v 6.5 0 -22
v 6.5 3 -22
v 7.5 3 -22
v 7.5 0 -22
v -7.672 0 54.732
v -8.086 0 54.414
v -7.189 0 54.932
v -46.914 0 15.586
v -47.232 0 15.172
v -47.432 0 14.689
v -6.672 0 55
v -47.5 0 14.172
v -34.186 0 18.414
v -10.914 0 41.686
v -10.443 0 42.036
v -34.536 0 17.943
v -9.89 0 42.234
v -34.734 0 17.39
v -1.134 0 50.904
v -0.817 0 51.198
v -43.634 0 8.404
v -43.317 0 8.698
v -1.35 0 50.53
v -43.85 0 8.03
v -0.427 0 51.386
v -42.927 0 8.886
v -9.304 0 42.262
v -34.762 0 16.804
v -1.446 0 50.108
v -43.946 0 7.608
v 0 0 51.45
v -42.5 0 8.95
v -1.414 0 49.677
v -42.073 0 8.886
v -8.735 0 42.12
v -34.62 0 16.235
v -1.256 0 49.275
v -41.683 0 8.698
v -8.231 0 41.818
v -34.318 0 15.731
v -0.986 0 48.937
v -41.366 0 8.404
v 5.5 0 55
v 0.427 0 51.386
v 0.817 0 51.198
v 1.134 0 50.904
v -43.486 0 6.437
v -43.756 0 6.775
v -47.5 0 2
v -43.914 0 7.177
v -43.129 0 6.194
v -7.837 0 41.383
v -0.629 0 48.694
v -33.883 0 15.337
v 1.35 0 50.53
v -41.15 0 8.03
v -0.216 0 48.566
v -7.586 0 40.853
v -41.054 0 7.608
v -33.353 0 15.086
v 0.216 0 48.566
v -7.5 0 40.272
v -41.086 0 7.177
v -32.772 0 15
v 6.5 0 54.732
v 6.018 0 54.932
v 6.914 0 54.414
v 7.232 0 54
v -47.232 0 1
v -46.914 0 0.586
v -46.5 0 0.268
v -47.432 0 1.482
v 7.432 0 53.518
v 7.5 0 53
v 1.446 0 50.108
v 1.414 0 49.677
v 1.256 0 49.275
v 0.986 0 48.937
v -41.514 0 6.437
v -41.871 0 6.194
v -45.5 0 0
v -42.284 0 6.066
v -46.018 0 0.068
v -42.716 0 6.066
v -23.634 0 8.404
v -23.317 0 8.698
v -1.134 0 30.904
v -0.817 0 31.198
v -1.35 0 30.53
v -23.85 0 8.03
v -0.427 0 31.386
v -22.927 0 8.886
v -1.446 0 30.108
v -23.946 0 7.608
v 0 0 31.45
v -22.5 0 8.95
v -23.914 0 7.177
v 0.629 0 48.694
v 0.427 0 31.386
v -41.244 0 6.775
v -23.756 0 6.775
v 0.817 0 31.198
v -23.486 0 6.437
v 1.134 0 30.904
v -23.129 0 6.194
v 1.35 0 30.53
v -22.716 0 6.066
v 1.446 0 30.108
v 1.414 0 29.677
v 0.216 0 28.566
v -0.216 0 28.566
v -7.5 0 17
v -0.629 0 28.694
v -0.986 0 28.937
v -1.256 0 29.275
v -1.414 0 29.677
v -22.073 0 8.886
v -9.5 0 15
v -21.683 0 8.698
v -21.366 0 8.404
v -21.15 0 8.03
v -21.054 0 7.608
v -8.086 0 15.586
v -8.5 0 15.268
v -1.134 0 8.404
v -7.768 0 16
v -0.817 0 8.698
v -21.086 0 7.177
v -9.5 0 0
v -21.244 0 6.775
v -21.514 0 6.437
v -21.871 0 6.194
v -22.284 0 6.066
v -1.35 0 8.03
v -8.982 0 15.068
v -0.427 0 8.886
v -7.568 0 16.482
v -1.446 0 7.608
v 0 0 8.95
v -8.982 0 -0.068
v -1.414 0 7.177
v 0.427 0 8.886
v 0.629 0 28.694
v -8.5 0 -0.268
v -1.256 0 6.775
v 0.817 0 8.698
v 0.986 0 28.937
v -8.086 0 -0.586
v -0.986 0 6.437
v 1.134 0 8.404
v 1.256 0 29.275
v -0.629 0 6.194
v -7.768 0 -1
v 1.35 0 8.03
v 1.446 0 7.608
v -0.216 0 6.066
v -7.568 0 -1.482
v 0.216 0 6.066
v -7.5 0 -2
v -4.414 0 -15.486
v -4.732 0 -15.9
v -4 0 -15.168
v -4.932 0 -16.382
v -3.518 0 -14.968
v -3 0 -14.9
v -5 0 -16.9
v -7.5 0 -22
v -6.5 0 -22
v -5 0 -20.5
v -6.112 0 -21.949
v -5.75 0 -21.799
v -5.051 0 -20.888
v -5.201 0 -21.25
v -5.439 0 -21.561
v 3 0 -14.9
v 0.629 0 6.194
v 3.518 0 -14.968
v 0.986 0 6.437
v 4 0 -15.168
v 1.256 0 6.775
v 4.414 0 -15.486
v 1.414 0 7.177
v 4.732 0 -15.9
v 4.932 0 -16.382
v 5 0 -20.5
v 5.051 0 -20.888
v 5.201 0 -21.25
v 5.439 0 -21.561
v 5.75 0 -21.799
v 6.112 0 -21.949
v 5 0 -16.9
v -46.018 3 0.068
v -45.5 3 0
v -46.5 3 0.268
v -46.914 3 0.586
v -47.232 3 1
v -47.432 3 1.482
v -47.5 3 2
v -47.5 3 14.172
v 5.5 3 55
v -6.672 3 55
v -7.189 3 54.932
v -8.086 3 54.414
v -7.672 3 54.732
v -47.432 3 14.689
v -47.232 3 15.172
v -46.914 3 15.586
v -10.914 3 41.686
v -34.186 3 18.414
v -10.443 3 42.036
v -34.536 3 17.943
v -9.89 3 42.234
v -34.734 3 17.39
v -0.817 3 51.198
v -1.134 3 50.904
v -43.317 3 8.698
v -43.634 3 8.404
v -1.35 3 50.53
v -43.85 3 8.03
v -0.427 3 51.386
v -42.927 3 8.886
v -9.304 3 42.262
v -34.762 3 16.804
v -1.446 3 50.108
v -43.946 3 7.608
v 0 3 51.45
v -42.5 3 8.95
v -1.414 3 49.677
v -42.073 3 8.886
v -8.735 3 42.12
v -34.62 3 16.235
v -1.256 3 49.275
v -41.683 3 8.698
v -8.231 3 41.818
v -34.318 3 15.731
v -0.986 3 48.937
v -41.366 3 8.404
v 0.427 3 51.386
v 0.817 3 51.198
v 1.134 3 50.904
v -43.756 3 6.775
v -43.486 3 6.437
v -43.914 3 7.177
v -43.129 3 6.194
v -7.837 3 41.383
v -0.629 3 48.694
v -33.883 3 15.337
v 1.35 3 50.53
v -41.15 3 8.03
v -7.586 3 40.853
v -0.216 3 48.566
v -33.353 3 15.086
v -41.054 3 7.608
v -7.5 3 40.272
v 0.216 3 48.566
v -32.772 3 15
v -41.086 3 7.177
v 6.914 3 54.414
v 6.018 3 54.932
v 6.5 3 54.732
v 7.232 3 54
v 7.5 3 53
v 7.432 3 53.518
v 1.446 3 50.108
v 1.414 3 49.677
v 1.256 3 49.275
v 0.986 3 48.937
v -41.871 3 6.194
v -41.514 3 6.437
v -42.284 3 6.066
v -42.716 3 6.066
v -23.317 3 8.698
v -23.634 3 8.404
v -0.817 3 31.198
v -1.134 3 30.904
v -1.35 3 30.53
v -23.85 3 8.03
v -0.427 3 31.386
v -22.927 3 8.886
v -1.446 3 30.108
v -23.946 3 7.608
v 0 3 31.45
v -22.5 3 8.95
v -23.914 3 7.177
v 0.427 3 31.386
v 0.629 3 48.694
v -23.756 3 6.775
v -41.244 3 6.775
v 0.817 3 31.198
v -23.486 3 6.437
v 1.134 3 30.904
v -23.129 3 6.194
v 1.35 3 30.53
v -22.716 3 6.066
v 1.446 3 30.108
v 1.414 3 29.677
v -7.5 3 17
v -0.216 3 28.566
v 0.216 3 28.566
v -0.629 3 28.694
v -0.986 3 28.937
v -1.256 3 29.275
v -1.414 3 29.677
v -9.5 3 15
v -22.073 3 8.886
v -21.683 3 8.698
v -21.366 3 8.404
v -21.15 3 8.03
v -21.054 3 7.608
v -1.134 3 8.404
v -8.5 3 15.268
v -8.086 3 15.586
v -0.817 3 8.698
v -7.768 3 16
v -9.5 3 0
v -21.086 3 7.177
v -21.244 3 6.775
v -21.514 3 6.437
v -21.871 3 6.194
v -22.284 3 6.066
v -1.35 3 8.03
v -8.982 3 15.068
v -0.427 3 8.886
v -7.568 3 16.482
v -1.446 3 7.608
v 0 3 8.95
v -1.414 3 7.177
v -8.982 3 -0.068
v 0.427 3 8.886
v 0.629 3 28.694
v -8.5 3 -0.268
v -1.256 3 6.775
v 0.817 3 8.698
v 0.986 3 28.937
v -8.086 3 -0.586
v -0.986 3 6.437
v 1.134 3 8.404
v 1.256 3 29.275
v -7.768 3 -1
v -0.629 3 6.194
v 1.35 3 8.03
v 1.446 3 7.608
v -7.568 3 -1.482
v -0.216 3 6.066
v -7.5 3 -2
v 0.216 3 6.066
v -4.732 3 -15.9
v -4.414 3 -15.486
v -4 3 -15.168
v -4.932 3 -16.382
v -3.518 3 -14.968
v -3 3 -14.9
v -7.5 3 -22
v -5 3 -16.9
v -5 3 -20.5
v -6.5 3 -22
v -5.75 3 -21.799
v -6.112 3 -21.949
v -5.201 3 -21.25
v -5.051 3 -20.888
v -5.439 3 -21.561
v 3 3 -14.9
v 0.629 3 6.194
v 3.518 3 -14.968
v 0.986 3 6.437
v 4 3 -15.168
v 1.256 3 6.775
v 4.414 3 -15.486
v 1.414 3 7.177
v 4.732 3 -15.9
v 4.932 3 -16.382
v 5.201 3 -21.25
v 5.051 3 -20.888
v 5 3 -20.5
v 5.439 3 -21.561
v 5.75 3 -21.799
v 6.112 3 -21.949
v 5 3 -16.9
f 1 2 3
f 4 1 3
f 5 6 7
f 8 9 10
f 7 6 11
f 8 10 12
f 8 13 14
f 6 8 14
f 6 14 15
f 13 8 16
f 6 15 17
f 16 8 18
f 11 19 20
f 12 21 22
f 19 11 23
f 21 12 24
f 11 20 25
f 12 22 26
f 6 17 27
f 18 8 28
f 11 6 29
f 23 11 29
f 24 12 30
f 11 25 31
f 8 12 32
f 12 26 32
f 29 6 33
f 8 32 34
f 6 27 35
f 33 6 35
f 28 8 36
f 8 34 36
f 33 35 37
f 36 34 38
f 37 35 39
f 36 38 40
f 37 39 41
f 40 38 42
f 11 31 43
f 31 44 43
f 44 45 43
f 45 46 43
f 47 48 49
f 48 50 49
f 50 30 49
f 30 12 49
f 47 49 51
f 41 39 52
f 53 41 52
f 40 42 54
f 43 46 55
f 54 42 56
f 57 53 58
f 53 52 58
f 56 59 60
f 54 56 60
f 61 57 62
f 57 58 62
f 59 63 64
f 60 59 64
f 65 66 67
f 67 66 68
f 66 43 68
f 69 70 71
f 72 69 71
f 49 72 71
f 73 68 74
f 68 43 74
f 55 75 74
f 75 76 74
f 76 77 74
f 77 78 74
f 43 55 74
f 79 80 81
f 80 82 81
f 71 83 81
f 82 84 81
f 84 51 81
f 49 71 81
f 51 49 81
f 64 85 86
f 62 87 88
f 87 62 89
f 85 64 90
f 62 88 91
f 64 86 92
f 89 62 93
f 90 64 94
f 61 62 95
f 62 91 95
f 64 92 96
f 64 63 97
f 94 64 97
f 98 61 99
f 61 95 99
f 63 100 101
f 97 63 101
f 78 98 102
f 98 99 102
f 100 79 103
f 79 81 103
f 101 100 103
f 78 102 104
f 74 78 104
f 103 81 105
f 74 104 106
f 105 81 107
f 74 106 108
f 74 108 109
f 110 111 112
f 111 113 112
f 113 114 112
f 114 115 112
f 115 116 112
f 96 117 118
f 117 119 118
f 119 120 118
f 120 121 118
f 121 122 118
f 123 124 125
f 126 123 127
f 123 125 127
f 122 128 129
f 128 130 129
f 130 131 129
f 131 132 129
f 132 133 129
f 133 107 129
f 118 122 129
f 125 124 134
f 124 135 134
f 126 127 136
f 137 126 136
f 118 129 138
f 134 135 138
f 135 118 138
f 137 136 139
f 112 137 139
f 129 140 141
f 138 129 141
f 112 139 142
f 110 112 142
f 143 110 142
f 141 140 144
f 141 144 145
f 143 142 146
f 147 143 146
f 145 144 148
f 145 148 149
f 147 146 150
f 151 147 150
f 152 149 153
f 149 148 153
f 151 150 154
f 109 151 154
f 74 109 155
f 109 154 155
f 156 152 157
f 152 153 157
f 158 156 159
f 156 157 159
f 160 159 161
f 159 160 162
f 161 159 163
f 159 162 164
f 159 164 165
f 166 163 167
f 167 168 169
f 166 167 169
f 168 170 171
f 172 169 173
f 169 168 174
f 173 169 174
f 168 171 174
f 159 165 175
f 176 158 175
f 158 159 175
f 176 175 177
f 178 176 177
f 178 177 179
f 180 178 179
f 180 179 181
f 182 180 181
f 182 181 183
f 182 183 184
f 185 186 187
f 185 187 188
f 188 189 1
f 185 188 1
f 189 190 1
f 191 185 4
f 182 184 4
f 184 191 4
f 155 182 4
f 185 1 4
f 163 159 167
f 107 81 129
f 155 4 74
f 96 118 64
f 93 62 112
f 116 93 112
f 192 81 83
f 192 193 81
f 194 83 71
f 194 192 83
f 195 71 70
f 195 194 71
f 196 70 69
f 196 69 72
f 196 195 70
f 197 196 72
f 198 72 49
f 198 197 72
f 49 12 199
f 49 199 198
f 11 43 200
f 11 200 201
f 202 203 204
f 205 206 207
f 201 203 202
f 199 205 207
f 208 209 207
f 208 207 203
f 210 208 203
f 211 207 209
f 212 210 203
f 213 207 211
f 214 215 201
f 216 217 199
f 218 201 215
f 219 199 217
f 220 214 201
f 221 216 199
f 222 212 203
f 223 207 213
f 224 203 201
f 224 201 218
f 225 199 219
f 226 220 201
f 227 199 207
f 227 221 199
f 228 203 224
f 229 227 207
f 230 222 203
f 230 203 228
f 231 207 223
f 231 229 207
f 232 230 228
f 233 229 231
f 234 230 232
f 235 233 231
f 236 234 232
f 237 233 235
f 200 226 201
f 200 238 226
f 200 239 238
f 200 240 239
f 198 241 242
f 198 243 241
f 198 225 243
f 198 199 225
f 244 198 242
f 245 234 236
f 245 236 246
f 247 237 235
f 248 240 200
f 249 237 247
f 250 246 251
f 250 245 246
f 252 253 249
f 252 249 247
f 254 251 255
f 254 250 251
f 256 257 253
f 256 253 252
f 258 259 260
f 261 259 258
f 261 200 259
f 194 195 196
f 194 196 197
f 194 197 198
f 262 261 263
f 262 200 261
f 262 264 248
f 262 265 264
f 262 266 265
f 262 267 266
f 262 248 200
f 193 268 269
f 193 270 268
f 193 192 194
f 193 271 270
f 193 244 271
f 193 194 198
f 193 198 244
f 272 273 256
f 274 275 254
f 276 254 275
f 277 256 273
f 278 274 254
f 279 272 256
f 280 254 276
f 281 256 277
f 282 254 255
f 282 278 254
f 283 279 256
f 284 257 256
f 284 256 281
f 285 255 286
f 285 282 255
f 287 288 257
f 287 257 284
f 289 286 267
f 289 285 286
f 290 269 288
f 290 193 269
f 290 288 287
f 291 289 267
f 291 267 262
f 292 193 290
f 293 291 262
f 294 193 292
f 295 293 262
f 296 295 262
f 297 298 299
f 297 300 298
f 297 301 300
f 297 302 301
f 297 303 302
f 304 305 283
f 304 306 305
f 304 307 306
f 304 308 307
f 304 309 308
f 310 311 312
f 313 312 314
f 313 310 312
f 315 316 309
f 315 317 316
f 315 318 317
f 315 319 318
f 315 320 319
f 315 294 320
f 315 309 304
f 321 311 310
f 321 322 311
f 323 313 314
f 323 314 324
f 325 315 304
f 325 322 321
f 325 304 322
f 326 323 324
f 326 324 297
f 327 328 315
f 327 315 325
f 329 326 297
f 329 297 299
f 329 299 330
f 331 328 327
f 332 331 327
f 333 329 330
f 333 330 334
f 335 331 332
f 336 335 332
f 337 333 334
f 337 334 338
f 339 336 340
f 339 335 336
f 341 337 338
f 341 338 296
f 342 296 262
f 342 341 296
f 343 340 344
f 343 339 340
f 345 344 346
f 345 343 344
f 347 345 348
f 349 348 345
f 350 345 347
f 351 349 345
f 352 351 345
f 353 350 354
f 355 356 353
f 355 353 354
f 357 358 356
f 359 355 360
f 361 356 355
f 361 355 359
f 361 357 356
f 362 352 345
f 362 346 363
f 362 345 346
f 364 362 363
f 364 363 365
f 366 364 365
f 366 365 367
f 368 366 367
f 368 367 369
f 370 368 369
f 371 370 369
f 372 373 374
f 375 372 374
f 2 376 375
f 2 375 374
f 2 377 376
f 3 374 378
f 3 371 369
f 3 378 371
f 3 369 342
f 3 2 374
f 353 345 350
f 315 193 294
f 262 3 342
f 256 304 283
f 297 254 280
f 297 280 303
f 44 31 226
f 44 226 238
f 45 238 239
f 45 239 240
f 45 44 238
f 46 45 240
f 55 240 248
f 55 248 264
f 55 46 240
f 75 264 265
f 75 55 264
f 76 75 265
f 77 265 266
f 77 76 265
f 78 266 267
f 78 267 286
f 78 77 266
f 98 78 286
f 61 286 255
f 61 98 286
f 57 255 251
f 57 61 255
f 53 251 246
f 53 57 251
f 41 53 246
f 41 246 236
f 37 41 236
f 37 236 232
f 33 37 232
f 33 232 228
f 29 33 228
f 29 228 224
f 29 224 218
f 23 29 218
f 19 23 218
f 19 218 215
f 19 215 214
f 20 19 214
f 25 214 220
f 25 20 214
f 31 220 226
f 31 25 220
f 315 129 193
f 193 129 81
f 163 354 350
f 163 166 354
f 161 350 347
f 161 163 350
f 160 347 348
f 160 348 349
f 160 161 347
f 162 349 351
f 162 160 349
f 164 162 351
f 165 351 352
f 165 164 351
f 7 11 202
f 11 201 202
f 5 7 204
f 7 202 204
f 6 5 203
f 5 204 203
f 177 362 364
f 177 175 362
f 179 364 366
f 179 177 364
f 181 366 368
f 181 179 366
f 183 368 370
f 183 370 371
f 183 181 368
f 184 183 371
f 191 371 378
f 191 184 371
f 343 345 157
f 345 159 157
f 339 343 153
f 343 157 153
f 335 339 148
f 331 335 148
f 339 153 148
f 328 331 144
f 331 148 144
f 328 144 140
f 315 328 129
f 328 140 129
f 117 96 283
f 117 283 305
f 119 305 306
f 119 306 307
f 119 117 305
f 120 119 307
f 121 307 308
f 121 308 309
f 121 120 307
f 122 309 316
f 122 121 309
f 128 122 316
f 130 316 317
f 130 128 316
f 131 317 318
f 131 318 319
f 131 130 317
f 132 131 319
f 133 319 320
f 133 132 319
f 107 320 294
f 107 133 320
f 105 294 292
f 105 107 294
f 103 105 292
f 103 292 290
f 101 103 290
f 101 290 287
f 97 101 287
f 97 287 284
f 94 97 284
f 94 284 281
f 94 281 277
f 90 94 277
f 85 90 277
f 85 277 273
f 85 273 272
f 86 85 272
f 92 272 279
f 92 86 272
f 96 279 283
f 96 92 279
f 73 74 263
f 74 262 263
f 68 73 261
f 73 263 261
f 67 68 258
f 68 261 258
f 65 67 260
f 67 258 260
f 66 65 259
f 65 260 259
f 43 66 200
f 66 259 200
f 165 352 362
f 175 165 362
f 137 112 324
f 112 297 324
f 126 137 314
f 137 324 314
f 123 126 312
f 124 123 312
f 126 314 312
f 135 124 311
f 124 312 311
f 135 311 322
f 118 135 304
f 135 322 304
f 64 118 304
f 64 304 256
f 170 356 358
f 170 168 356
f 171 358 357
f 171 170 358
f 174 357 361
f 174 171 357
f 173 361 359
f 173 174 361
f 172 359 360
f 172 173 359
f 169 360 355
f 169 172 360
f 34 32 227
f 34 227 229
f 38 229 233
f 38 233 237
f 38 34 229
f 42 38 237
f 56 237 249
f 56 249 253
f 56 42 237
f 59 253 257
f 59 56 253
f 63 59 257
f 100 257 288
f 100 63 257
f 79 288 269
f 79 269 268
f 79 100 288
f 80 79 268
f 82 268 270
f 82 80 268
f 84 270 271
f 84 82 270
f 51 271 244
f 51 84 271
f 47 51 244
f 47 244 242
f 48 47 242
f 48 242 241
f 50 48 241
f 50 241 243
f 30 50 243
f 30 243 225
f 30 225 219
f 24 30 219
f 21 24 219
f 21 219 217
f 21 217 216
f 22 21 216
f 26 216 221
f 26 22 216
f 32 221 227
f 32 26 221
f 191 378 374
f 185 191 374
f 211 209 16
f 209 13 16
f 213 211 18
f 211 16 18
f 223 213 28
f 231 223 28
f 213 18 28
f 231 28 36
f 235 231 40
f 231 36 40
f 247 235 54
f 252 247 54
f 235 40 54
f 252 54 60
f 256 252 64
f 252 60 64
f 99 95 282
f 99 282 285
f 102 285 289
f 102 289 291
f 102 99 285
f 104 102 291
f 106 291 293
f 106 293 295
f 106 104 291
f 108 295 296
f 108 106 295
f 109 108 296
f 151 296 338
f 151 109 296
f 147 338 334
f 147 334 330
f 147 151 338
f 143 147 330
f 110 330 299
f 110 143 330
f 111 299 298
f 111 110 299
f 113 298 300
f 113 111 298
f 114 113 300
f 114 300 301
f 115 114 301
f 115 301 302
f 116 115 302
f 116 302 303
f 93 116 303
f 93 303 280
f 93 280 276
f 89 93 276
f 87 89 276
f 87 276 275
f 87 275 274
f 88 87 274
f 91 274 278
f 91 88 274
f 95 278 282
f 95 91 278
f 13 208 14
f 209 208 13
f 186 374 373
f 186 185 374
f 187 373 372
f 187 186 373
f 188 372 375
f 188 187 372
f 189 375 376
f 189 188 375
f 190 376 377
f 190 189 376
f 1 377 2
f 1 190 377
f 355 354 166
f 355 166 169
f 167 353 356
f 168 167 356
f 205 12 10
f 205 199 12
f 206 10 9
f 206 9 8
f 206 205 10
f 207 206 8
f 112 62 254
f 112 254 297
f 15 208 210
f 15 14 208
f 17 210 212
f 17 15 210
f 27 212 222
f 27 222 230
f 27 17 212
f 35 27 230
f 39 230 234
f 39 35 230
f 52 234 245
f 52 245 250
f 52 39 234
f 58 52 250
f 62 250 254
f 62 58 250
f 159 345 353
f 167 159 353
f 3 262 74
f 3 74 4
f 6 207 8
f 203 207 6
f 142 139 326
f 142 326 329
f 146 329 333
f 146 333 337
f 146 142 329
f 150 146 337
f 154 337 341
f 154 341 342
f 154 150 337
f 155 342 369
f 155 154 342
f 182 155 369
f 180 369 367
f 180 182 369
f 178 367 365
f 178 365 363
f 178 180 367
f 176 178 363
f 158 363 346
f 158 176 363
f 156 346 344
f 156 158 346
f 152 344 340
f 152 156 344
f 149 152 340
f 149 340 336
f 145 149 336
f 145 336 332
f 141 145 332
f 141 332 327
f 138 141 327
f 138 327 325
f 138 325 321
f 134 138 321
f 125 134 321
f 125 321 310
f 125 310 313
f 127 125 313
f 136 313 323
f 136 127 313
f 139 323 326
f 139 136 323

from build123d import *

# Parameters (mm, degrees)
SKETCH_1_R          = 1.45
EXTRUDE_1_DEPTH     = 3
EXTRUDE_2_DEPTH     = 3
SKETCH_4_W          = 40
SKETCH_4_H          = 55
CUT_EXTRUDE_2_DEPTH = 73.734104793
SKETCH_5_W          = 15
SKETCH_5_H          = 22
EXTRUDE_3_DEPTH     = 3
SKETCH_6_W          = 10
SKETCH_6_H          = 7.1
CUT_EXTRUDE_3_DEPTH = 73.734104793
FILLET_1_R          = 2
FILLET_2_R          = 1.5


with BuildPart() as part:
    # 草图1 → 凸台-拉伸1 (new body)
    with BuildSketch(Plane(origin=(0, 0, 0), x_dir=(1, 0, 0), z_dir=(0, 1, 0))):
        Polygon((-47.5, 0), (0, 0), (47.5, 0), (47.5, -15), (7.5, -15), (7.5, -55), (-7.5, -55), (-7.5, -15), (-47.5, -15), align=None)
        with Locations(Location((0, -7.5, 0), (0, 0, 270))):
            Circle(SKETCH_1_R, mode=Mode.SUBTRACT)
        with Locations(Location((0, -30, 0), (0, 0, 270))):
            Circle(SKETCH_1_R, mode=Mode.SUBTRACT)
        with Locations(Location((0, -50, 0), (0, 0, 270))):
            Circle(SKETCH_1_R, mode=Mode.SUBTRACT)
        with Locations(Location((-22.5, -7.5, 0), (0, 0, 270))):
            Circle(SKETCH_1_R, mode=Mode.SUBTRACT)
        with Locations(Location((-42.5, -7.5, 0), (0, 0, 270))):
            Circle(SKETCH_1_R, mode=Mode.SUBTRACT)
        with Locations(Location((42.5, -7.5, 0), (0, 0, 90))):
            Circle(SKETCH_1_R, mode=Mode.SUBTRACT)
        with Locations(Location((22.5, -7.5, 0), (0, 0, 90))):
            Circle(SKETCH_1_R, mode=Mode.SUBTRACT)
    extrude(amount=EXTRUDE_1_DEPTH)

    # 草图2 → 凸台-拉伸2 (add)
    with BuildSketch(Plane(origin=(0, 3, 0), x_dir=(1, 0, 0), z_dir=(0, 1, 0))):
        Polygon((-47.5, -15), (-7.5, -55), (-7.5, -45.100505063), (-37.600505063, -15), align=None)
        Polygon((37.600505063, -15), (47.5, -15), (7.5, -55), (7.5, -45.100505063), align=None)
    extrude(amount=-EXTRUDE_2_DEPTH)

    # 草图4 → 切除-拉伸2 (cut, through all)
    with BuildSketch(Plane(origin=(0, 3, 0), x_dir=(1, 0, 0), z_dir=(0, 1, 0))):
        with Locations((27.5, -27.5)):
            Rectangle(SKETCH_4_W, SKETCH_4_H)
    extrude(amount=-CUT_EXTRUDE_2_DEPTH, mode=Mode.SUBTRACT)

    # 草图5 → 凸台-拉伸3 (add)
    with BuildSketch(Plane(origin=(0, 3, 0), x_dir=(1, 0, 0), z_dir=(0, 1, 0))):
        with Locations((0, 11)):
            Rectangle(SKETCH_5_W, SKETCH_5_H)
    extrude(amount=-EXTRUDE_3_DEPTH)

    # 草图6 → 切除-拉伸3 (cut, through all)
    with BuildSketch(Plane(origin=(0, 3, 0), x_dir=(1, 0, 0), z_dir=(0, 1, 0))):
        with Locations((0, 18.45)):
            Rectangle(SKETCH_6_W, SKETCH_6_H)
    extrude(amount=-CUT_EXTRUDE_3_DEPTH, mode=Mode.SUBTRACT)

    # 圆角1
    fillet_1_edges = [part.edges().sort_by_distance(p)[0] for p in [
        (-7.5, 1.5, 0),
        (-5, 1.5, -14.9),
        (5, 1.5, -14.9),
        (-47.5, 1.5, 0),
        (7.5, 1.5, 55),
        (-7.5, 1.5, 55),
        (-7.5, 1.5, 15),
        (-47.5, 1.5, 15),
        (-7.5, 1.5, 45.100505063),
        (-37.600505063, 1.5, 15),
    ]]
    fillet(fillet_1_edges, radius=FILLET_1_R)

    # 圆角2
    fillet_2_edges = [part.edges().sort_by_distance(p)[0] for p in [
        (-5, 1.5, -22),
        (5, 1.5, -22),
    ]]
    fillet(fillet_2_edges, radius=FILLET_2_R)


solid = part.part
